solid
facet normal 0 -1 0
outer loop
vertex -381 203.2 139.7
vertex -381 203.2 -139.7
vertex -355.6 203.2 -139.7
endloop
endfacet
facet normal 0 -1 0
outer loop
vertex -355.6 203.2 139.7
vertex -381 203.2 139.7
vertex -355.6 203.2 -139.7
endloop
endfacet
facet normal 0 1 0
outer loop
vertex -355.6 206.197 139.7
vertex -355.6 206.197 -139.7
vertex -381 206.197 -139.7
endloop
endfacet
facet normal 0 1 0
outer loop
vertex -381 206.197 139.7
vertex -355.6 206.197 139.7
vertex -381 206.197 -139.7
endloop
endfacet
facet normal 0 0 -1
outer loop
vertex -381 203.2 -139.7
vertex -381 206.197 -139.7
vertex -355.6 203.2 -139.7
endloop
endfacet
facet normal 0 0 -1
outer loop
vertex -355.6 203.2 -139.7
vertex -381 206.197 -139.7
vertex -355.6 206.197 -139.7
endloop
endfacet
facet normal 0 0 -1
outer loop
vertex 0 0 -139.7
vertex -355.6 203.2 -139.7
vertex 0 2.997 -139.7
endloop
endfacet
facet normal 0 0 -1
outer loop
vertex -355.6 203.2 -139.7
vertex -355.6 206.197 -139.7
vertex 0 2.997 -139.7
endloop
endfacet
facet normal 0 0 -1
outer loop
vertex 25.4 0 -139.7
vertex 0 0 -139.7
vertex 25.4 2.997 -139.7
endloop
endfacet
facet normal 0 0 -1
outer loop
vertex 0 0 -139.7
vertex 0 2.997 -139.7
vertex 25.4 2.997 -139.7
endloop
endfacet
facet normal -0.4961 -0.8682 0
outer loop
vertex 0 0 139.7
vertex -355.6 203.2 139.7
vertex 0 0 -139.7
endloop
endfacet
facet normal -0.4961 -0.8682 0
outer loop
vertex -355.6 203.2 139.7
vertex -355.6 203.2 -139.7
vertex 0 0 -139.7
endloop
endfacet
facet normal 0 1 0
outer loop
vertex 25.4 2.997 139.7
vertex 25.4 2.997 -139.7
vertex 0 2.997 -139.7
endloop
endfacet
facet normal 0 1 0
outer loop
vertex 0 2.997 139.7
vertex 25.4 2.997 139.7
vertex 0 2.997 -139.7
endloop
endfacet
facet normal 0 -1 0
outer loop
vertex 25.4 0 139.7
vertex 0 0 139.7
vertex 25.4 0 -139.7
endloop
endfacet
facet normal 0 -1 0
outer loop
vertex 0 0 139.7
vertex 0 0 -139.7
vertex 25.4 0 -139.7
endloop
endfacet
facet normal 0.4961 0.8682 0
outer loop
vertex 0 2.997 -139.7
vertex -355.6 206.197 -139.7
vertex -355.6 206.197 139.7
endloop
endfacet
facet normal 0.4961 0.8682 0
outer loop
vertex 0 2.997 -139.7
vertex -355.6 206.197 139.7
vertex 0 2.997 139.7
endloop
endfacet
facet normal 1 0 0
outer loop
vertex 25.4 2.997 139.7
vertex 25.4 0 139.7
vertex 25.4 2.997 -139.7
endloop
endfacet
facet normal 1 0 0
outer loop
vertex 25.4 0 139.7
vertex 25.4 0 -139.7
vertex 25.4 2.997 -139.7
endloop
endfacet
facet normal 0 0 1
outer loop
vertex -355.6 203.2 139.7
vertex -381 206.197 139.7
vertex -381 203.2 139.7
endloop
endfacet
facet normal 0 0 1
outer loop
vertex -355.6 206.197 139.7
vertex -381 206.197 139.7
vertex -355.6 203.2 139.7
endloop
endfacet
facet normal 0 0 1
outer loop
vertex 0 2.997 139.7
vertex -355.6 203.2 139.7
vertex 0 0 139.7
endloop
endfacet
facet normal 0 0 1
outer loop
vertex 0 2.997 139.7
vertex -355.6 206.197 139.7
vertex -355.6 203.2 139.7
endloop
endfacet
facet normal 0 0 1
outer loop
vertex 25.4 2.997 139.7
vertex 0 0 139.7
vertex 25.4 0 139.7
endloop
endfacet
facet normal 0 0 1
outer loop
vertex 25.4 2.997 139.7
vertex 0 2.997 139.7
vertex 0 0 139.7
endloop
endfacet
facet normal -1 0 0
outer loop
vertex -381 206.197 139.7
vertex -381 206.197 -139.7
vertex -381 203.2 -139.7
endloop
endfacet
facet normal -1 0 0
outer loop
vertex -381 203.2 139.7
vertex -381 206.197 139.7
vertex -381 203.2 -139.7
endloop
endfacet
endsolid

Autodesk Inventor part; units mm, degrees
ref_plane "YZ Plane" through (0, 0, 0) normal (1, 0, 0) x (0, 1, 0)
ref_plane "XZ Plane" through (0, 0, 0) normal (0, 1, 0) x (-1, 0, 0)
ref_plane "XY Plane" through (0, 0, 0) normal (0, 0, 1) x (1, 0, 0)
sketch "Sketch1" plane through (0, 0, 0) normal (0, 0, 1) x (1, 0, 0)
  line L0 (0, 0) -> (25.4, 0)
  line L1 (25.4, 0) -> (25.4, 2.9972)
  line L2 (25.4, 2.9972) -> (0, 2.9972)
  line L3 (-355.6, 206.1972) -> (0, 2.9972)
  line L4 (-355.6, 206.1972) -> (-381, 206.1972)
  line L5 (-381, 206.1972) -> (-381, 203.2)
  line L6 (-381, 203.2) -> (-355.6, 203.2)
  line L7 (-355.6, 203.2) -> (0, 0)
  dimension "d0" = 25.4
  dimension "d1" = 2.9972
  dimension "d2" = 25.4
  dimension "d3" = 25.4
  dimension "d4" = 2.9972
  dimension "d5" = 25.4
extrude "Extrusion1" add sketch "Sketch1" along normal mid plane 279.4
properties part number "TemporaryLexan"
